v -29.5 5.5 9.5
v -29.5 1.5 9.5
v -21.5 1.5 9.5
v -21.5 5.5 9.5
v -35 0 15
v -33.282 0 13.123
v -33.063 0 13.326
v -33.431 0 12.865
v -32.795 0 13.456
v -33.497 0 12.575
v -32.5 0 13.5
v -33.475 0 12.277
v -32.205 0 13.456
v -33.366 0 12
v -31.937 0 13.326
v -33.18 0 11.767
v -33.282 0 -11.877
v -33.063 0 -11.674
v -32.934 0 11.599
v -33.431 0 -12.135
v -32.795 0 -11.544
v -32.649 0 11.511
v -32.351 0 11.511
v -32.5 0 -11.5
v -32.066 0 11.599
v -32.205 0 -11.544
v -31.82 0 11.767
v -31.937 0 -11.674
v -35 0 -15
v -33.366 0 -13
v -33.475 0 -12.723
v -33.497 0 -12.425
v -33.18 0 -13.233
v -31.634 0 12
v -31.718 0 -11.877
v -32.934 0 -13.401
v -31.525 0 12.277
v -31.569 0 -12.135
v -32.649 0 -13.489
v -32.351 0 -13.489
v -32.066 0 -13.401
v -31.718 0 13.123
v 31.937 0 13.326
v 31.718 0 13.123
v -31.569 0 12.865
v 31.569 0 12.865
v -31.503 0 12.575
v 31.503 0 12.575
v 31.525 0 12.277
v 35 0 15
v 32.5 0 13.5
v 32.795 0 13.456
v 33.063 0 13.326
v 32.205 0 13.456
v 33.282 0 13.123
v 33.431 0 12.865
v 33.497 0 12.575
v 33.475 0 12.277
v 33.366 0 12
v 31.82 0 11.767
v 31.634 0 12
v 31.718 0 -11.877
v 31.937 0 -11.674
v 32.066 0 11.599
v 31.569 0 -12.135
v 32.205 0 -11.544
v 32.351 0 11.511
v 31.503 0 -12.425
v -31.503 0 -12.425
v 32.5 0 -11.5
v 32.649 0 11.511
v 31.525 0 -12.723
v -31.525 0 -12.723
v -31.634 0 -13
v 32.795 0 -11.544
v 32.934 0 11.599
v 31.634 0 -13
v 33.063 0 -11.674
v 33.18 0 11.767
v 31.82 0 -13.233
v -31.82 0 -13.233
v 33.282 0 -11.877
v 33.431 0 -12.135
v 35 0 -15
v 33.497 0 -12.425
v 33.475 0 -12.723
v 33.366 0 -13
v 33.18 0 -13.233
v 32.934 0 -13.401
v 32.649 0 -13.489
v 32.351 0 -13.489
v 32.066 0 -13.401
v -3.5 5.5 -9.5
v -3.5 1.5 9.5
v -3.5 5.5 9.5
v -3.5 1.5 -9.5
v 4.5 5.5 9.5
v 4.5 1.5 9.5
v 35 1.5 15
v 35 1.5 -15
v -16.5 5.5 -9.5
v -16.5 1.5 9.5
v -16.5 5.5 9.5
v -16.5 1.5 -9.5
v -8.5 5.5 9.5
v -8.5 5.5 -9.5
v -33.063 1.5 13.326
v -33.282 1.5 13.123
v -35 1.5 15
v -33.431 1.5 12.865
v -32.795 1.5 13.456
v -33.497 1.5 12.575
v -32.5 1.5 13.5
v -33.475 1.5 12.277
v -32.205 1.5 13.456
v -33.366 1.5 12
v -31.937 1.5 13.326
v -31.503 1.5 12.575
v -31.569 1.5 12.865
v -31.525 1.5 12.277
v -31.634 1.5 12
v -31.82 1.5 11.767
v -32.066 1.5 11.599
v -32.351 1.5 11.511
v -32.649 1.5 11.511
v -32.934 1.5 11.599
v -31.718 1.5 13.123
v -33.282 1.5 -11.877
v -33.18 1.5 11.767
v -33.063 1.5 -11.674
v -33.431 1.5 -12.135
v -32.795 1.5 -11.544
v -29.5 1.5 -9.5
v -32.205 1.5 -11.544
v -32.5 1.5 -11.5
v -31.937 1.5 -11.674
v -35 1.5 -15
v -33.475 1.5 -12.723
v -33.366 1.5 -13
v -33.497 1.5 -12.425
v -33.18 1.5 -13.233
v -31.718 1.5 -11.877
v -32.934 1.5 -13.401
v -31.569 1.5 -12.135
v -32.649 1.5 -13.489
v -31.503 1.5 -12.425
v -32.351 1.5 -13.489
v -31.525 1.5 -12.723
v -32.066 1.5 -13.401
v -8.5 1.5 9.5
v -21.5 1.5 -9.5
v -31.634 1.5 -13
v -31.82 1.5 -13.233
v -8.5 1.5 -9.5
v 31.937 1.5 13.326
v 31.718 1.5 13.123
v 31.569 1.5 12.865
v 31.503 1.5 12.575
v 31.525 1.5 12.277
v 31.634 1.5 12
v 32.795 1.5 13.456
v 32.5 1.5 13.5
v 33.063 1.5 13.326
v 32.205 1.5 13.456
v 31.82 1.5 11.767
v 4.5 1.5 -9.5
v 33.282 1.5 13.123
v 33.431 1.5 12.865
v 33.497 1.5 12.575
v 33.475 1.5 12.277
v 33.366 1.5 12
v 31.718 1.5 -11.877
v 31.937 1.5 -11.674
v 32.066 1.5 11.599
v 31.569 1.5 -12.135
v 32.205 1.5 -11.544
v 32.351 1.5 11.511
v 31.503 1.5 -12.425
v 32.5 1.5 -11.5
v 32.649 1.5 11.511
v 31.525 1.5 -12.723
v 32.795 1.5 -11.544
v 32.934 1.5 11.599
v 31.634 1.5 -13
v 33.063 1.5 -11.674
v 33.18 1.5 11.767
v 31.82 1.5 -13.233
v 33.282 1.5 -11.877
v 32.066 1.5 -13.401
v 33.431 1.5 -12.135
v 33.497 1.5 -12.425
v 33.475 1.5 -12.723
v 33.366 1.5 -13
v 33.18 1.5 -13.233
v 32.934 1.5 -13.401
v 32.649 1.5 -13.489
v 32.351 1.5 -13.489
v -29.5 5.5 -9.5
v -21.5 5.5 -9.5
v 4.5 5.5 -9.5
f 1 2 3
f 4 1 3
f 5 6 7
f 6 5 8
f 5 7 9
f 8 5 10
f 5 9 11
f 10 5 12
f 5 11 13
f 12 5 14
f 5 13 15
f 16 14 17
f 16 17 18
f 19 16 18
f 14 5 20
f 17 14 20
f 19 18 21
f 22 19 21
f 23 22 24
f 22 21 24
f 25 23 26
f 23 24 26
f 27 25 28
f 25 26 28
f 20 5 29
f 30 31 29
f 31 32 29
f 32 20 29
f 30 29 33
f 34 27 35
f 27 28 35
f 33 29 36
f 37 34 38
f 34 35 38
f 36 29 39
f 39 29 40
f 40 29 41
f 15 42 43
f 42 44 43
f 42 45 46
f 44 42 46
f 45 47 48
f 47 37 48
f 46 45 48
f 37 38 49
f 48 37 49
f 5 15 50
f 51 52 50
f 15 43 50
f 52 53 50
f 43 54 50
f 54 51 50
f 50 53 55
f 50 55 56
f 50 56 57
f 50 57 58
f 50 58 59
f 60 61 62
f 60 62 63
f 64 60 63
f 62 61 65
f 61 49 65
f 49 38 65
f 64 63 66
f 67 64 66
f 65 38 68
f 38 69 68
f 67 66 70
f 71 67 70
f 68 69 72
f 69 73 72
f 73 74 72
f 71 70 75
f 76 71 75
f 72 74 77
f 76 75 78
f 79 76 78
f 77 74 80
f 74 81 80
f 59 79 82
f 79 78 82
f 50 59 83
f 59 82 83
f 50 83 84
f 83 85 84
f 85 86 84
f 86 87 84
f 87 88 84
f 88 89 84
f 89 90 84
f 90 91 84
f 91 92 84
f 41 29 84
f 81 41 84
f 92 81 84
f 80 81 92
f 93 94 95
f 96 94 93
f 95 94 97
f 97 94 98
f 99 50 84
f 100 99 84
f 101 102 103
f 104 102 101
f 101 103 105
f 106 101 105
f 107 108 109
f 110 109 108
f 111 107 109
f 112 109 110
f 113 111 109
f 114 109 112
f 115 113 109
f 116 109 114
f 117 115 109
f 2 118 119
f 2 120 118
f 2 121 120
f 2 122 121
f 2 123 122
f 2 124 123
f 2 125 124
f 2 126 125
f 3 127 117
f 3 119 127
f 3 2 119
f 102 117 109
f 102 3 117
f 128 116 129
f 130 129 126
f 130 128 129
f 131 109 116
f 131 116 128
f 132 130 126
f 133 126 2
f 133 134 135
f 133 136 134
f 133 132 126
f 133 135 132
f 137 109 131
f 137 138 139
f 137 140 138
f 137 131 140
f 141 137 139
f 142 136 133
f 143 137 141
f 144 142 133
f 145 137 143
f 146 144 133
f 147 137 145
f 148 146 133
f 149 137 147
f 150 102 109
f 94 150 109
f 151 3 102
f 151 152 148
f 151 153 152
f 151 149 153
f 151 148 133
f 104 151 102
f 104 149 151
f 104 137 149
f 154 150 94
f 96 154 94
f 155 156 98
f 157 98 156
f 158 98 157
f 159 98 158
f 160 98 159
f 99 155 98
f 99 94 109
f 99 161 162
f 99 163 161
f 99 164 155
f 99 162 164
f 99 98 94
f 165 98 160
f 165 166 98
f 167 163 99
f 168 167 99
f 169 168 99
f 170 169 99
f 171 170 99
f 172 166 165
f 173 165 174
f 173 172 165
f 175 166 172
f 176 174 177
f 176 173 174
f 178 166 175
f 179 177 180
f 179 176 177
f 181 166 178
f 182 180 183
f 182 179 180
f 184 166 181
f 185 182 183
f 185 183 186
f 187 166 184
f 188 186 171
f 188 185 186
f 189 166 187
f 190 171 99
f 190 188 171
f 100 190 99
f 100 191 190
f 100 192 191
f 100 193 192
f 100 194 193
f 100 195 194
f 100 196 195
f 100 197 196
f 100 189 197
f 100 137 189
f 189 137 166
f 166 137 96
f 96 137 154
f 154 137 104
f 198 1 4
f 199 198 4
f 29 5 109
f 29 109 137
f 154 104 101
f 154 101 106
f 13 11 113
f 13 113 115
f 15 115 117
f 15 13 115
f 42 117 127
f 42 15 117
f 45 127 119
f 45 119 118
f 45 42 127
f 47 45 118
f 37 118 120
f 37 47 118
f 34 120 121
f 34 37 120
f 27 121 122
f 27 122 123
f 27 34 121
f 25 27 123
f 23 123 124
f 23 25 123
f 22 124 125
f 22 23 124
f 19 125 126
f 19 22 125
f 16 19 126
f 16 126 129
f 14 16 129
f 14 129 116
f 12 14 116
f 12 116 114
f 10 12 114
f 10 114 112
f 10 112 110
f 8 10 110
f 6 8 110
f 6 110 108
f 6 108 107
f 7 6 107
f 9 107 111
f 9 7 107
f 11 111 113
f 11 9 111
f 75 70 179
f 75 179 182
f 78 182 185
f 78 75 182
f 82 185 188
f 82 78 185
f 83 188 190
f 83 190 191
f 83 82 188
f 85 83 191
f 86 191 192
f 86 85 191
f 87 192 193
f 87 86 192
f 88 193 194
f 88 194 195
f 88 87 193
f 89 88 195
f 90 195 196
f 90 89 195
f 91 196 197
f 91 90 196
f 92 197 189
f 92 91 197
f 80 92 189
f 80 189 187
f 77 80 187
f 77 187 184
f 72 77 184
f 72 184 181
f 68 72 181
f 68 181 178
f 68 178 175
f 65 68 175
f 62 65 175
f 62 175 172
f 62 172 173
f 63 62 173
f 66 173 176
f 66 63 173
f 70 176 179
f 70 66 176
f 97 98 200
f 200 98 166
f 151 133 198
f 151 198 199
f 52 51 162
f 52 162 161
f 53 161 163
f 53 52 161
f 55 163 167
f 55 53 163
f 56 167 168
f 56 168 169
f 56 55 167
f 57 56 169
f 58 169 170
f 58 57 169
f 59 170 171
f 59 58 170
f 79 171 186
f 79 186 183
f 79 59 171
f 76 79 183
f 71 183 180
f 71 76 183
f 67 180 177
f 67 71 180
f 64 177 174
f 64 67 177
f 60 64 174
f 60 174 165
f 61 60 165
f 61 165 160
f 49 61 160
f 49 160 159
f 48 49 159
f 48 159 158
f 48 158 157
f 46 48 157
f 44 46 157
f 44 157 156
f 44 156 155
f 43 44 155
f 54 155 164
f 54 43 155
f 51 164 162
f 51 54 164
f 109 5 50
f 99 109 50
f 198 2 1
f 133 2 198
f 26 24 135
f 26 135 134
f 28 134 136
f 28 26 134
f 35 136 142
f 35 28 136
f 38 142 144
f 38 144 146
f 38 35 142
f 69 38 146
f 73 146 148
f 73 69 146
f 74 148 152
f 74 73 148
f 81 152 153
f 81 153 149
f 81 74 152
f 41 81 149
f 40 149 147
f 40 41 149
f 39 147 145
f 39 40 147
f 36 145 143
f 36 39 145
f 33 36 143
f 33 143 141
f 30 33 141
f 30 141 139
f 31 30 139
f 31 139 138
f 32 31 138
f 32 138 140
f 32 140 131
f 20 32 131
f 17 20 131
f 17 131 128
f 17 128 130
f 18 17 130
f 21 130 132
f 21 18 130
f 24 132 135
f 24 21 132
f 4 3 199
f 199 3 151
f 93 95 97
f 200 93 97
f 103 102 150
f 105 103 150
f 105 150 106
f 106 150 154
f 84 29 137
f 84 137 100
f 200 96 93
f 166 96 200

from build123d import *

# Parameters (mm, degrees)
SKETCH_1_W      = 70
SKETCH_1_H      = 30
SKETCH_1_R      = 1
EXTRUDE_1_DEPTH = 1.5
SKETCH_2_W      = 8
SKETCH_2_H      = 19
EXTRUDE_2_DEPTH = 4


with BuildPart() as part:
    # Эскиз1 → Бобышка-Вытянуть1 (new body)
    with BuildSketch(Plane(origin=(0, 0, 0), x_dir=(1, 0, 0), z_dir=(0, 1, 0))):
        Rectangle(SKETCH_1_W, SKETCH_1_H)
        with Locations(Location((-32.5, 12.5, 0), (0, 0, 270))):
            Circle(SKETCH_1_R, mode=Mode.SUBTRACT)
        with Locations(Location((32.5, 12.5, 0), (0, 0, 270))):
            Circle(SKETCH_1_R, mode=Mode.SUBTRACT)
        with Locations(Location((32.5, -12.5, 0), (0, 0, 270))):
            Circle(SKETCH_1_R, mode=Mode.SUBTRACT)
        with Locations(Location((-32.5, -12.5, 0), (0, 0, 270))):
            Circle(SKETCH_1_R, mode=Mode.SUBTRACT)
    extrude(amount=EXTRUDE_1_DEPTH)

    # Эскиз2 → Бобышка-Вытянуть2 (add)
    with BuildSketch(Plane(origin=(0, 1.5, 0), x_dir=(1, 0, 0), z_dir=(0, 1, 0))):
        with Locations((-25.5, 0)):
            Rectangle(SKETCH_2_W, SKETCH_2_H)
        with Locations((-12.5, 0)):
            Rectangle(SKETCH_2_W, SKETCH_2_H)
        with Locations((0.5, 0)):
            Rectangle(SKETCH_2_W, SKETCH_2_H)
    extrude(amount=EXTRUDE_2_DEPTH)


solid = part.part
